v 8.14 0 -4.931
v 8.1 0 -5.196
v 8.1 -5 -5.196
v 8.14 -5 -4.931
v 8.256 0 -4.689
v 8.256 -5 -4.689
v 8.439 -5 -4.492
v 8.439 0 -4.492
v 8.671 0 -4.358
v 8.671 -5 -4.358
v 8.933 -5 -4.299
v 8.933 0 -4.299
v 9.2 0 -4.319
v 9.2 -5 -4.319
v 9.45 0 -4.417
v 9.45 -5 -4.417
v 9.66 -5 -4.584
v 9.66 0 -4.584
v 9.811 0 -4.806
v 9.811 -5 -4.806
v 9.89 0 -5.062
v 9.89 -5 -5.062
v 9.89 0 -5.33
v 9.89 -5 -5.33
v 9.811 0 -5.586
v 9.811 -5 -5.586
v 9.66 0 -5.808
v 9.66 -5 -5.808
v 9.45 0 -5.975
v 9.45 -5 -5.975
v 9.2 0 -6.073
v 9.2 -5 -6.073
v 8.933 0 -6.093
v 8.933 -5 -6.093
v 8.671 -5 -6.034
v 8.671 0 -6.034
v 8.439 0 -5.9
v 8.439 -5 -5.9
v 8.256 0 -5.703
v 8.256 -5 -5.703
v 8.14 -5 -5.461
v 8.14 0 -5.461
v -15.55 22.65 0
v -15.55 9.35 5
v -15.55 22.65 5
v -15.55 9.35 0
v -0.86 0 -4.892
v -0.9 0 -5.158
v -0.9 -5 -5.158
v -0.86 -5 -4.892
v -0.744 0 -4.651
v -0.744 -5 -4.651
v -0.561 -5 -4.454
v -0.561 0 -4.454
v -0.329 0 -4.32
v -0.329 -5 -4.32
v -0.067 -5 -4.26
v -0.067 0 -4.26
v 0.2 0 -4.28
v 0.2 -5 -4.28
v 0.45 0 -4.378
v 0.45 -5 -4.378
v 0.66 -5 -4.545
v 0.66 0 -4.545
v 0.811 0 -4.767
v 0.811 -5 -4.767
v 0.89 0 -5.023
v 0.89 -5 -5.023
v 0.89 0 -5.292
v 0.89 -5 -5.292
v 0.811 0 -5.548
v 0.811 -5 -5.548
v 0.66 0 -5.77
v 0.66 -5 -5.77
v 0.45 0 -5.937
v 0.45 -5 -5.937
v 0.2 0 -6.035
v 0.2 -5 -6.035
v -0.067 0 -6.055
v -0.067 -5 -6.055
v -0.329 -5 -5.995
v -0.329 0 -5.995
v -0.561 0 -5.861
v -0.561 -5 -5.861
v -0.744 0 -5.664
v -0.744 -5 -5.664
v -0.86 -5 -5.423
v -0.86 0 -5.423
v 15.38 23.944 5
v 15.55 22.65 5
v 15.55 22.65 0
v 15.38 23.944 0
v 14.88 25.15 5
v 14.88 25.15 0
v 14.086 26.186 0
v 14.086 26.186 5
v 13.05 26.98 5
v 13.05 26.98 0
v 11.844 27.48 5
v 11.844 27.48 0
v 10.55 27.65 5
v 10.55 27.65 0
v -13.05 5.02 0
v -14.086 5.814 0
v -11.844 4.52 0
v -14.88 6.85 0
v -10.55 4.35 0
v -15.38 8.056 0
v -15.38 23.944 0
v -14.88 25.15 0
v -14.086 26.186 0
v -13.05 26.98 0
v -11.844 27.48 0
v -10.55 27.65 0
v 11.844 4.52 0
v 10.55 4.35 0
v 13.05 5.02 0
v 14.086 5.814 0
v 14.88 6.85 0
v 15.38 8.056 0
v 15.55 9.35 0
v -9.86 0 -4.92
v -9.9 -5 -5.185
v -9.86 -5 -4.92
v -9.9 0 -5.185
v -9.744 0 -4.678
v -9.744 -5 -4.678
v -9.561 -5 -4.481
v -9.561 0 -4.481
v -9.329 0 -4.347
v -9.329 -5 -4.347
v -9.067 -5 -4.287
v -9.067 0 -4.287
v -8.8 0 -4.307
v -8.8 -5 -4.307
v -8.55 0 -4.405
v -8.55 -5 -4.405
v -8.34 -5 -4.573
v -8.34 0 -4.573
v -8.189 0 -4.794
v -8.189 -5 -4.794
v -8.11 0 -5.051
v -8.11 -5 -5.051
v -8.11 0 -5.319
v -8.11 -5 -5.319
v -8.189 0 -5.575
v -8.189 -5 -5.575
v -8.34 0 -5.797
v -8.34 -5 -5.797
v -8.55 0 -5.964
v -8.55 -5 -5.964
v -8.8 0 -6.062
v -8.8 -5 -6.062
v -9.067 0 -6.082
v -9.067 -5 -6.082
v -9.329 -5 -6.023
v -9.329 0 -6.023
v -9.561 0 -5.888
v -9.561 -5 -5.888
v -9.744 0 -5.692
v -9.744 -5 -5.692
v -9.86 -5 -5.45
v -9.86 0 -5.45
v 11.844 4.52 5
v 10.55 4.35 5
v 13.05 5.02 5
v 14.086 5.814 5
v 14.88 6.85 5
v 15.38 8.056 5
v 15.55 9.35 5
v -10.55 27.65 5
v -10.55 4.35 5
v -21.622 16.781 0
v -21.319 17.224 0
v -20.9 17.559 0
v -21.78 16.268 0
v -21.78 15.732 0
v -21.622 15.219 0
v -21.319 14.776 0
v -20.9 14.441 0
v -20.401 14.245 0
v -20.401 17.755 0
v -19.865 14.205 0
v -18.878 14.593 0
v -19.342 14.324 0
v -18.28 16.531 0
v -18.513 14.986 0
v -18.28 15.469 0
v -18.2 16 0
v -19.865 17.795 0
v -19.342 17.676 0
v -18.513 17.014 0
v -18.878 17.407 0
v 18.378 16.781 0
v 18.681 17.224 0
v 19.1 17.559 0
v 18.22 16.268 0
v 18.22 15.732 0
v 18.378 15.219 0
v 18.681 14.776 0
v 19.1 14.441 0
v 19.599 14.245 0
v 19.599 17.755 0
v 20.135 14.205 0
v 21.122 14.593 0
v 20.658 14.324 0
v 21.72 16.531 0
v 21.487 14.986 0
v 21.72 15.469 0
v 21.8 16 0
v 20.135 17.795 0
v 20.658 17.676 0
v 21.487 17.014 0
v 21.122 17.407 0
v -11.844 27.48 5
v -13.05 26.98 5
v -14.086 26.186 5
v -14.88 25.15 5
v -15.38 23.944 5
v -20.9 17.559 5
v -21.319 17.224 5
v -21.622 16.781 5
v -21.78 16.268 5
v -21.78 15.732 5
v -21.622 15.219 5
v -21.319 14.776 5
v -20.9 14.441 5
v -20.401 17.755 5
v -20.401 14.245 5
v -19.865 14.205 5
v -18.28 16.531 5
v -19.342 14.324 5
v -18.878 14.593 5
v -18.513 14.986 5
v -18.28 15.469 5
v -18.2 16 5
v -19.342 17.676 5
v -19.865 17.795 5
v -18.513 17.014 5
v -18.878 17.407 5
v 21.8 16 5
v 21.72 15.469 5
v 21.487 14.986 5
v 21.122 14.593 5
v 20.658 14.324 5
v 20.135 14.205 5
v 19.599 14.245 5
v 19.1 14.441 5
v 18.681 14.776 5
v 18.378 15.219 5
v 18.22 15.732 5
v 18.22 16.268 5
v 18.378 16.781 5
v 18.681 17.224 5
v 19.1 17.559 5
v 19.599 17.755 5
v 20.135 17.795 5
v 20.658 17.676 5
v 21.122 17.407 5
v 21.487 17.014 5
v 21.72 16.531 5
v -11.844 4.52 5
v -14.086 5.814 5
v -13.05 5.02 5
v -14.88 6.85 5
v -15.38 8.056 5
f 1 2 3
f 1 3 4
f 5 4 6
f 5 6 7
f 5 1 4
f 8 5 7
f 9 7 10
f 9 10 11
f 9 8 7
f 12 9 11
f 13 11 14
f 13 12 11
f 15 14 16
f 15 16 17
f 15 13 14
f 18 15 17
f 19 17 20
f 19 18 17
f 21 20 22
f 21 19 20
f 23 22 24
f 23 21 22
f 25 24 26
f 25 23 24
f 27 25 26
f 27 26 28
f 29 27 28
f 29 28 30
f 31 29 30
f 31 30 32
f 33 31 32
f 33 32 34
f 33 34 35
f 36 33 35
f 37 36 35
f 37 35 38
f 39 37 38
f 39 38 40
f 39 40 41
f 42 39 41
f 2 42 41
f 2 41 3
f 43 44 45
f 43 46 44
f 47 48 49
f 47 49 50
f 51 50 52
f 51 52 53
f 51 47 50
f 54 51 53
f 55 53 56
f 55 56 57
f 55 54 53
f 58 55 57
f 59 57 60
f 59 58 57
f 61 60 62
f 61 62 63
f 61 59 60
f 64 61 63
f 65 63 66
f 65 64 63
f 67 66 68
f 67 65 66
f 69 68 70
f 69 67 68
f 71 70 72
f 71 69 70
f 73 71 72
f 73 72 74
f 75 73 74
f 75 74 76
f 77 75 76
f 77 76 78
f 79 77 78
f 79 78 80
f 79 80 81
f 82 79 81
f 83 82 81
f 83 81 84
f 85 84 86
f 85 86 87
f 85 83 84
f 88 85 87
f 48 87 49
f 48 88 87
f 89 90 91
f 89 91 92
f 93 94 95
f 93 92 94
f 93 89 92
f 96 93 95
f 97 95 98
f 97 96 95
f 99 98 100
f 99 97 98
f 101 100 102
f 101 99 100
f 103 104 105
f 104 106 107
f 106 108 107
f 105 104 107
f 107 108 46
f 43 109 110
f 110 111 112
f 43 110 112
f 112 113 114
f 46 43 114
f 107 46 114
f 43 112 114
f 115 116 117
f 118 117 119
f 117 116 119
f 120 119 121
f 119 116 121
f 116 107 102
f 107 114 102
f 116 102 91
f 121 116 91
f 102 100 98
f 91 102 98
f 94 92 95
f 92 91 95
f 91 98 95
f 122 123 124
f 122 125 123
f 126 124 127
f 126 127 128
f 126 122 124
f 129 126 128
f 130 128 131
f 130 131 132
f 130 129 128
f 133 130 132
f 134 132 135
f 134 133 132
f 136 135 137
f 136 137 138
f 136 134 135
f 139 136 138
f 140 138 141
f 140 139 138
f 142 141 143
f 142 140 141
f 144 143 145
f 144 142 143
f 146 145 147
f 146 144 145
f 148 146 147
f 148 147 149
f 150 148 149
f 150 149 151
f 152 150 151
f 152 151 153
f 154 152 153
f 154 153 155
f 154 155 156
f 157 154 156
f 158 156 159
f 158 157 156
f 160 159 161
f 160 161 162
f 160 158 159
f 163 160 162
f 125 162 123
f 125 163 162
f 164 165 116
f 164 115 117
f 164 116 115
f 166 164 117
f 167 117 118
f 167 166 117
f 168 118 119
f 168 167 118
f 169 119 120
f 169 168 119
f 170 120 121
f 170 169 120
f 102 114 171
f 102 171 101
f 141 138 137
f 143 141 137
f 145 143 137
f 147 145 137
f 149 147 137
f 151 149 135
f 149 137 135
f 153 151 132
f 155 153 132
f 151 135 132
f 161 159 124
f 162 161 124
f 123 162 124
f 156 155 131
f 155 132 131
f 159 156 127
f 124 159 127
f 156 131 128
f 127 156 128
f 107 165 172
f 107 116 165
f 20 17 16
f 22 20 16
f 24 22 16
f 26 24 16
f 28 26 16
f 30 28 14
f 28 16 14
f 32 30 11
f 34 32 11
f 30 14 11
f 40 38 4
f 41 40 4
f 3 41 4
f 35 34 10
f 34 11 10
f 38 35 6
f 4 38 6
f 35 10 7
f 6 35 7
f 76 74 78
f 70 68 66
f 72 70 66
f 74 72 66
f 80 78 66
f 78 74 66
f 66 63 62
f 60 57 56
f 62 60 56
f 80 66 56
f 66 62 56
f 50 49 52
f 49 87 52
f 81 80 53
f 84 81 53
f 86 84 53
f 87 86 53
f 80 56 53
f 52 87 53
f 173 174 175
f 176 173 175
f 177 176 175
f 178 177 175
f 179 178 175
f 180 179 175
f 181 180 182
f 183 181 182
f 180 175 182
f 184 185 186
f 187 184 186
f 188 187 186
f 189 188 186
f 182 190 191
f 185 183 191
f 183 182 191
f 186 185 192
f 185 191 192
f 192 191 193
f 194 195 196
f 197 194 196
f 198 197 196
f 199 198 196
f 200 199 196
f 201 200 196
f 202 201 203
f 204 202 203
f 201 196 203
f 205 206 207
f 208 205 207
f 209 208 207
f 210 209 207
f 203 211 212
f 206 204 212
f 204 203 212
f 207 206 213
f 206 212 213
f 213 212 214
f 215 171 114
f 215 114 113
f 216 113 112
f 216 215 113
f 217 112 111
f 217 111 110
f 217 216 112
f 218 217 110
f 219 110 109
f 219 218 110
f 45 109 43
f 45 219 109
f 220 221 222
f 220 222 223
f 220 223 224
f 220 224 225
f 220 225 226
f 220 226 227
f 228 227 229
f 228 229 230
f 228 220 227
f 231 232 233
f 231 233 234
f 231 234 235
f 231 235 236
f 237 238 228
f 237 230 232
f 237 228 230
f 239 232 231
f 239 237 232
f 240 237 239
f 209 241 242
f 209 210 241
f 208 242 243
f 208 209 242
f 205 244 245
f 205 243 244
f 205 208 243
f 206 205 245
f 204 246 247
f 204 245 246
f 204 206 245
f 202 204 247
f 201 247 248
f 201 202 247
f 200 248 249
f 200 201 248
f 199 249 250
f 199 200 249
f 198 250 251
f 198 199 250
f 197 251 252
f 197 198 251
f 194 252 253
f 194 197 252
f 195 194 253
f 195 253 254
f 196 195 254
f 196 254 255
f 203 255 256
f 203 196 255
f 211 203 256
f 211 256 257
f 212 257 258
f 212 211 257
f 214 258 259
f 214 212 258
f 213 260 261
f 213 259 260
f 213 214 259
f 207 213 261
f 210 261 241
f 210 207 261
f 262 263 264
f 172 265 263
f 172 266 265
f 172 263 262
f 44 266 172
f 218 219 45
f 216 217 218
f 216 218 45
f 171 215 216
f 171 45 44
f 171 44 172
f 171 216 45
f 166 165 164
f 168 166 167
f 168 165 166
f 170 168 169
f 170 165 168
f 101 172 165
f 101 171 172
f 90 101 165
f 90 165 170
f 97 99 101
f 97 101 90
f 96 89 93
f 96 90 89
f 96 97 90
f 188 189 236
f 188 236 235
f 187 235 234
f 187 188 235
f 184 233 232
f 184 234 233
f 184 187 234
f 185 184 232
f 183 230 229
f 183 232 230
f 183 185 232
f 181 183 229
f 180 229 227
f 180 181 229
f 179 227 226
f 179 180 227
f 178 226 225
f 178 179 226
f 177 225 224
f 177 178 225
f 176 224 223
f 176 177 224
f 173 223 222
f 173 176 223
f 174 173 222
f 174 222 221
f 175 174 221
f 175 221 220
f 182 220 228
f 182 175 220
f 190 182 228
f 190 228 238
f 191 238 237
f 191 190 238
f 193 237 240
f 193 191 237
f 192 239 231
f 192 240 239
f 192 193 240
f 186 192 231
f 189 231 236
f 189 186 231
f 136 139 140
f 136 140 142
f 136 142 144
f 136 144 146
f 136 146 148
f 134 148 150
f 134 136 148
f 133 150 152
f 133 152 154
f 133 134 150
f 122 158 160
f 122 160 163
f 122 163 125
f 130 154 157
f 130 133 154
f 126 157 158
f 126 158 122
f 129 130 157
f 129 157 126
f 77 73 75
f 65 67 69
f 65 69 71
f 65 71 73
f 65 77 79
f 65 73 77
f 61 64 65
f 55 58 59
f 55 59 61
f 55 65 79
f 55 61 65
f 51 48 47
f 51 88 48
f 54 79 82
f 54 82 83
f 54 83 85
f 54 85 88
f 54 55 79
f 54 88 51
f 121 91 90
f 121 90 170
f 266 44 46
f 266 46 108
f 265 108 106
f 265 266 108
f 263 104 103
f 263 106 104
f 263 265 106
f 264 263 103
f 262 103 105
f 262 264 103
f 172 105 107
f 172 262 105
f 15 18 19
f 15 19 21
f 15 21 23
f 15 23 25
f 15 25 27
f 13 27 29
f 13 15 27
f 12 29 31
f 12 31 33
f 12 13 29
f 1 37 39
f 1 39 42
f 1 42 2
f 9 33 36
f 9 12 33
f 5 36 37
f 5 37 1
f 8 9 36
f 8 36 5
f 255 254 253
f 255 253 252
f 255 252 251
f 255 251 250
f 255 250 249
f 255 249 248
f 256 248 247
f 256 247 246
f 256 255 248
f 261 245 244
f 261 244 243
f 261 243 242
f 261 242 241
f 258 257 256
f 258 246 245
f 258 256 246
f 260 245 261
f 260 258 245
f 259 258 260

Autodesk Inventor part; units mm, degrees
ref_plane "YZ Plane" through (0, 0, 0) normal (1, 0, 0) x (0, 1, 0)
ref_plane "XZ Plane" through (0, 0, 0) normal (0, 1, 0) x (-1, 0, 0)
ref_plane "XY Plane" through (0, 0, 0) normal (0, 0, 1) x (1, 0, 0)
sketch "Sketch1" plane through (0, 0, 0) normal (0, 0, 1) x (1, 0, 0)
  line L0 (-15.55, 27.65) -> (15.55, 27.65)
  line L1 (15.55, 27.65) -> (15.55, 4.35)
  line L2 (15.55, 4.35) -> (-15.55, 4.35)
  line L3 (-15.55, 4.35) -> (-15.55, 27.65)
  circle A0 centre (20, 16) radius 1.8
  circle A1 centre (-20, 16) radius 1.8
  point P0 (0, 0)
  dimension "d0" = 23.3
  dimension "d1" = 31.1
  dimension "d3" = 15.55
  dimension "d4" = 40
  dimension "d5" = 20
  dimension "d6" = 3.6
  dimension "d7" = 3.6
  dimension "d8" = 11.65
  dimension "d9" = 11.65
  dimension "d10" = 16
extrude "Extrusion1" add sketch "Sketch1" along normal blind 5
fillet "Fillet1" radius 5 1 edges at (15.55, 27.65, 2.5)
fillet "Fillet2" radius 5 1 edges at (-15.55, 27.65, 2.5)
fillet "Fillet3" radius 5 1 edges at (15.55, 4.35, 2.5)
fillet "Fillet4" radius 5 1 edges at (-15.55, 4.35, 2.5)
sketch "Sketch2" plane through (0, 0, 0) normal (0, 1, 0) x (-1, 0, 0)
  circle A0 centre (0, -5.1575) radius 0.9
  circle A1 centre (-8.9999, -5.196) radius 0.9
  circle A2 centre (9, -5.1848) radius 0.9
  point P0 (0, 0)
  dimension "d17" = 1.8
  dimension "d18" = 1.8
  dimension "d19" = 9
  dimension "d20" = 9
extrude "Extrusion2" add sketch "Sketch2" against normal blind 5
equation "\"d3\" = 0.5 * d1"
equation "\"d5\" = 0.5 * d4"
equation "\"d8\" = 0.5 * d0"
equation "\"d9\" = d8"
properties part number "AC entry module"
